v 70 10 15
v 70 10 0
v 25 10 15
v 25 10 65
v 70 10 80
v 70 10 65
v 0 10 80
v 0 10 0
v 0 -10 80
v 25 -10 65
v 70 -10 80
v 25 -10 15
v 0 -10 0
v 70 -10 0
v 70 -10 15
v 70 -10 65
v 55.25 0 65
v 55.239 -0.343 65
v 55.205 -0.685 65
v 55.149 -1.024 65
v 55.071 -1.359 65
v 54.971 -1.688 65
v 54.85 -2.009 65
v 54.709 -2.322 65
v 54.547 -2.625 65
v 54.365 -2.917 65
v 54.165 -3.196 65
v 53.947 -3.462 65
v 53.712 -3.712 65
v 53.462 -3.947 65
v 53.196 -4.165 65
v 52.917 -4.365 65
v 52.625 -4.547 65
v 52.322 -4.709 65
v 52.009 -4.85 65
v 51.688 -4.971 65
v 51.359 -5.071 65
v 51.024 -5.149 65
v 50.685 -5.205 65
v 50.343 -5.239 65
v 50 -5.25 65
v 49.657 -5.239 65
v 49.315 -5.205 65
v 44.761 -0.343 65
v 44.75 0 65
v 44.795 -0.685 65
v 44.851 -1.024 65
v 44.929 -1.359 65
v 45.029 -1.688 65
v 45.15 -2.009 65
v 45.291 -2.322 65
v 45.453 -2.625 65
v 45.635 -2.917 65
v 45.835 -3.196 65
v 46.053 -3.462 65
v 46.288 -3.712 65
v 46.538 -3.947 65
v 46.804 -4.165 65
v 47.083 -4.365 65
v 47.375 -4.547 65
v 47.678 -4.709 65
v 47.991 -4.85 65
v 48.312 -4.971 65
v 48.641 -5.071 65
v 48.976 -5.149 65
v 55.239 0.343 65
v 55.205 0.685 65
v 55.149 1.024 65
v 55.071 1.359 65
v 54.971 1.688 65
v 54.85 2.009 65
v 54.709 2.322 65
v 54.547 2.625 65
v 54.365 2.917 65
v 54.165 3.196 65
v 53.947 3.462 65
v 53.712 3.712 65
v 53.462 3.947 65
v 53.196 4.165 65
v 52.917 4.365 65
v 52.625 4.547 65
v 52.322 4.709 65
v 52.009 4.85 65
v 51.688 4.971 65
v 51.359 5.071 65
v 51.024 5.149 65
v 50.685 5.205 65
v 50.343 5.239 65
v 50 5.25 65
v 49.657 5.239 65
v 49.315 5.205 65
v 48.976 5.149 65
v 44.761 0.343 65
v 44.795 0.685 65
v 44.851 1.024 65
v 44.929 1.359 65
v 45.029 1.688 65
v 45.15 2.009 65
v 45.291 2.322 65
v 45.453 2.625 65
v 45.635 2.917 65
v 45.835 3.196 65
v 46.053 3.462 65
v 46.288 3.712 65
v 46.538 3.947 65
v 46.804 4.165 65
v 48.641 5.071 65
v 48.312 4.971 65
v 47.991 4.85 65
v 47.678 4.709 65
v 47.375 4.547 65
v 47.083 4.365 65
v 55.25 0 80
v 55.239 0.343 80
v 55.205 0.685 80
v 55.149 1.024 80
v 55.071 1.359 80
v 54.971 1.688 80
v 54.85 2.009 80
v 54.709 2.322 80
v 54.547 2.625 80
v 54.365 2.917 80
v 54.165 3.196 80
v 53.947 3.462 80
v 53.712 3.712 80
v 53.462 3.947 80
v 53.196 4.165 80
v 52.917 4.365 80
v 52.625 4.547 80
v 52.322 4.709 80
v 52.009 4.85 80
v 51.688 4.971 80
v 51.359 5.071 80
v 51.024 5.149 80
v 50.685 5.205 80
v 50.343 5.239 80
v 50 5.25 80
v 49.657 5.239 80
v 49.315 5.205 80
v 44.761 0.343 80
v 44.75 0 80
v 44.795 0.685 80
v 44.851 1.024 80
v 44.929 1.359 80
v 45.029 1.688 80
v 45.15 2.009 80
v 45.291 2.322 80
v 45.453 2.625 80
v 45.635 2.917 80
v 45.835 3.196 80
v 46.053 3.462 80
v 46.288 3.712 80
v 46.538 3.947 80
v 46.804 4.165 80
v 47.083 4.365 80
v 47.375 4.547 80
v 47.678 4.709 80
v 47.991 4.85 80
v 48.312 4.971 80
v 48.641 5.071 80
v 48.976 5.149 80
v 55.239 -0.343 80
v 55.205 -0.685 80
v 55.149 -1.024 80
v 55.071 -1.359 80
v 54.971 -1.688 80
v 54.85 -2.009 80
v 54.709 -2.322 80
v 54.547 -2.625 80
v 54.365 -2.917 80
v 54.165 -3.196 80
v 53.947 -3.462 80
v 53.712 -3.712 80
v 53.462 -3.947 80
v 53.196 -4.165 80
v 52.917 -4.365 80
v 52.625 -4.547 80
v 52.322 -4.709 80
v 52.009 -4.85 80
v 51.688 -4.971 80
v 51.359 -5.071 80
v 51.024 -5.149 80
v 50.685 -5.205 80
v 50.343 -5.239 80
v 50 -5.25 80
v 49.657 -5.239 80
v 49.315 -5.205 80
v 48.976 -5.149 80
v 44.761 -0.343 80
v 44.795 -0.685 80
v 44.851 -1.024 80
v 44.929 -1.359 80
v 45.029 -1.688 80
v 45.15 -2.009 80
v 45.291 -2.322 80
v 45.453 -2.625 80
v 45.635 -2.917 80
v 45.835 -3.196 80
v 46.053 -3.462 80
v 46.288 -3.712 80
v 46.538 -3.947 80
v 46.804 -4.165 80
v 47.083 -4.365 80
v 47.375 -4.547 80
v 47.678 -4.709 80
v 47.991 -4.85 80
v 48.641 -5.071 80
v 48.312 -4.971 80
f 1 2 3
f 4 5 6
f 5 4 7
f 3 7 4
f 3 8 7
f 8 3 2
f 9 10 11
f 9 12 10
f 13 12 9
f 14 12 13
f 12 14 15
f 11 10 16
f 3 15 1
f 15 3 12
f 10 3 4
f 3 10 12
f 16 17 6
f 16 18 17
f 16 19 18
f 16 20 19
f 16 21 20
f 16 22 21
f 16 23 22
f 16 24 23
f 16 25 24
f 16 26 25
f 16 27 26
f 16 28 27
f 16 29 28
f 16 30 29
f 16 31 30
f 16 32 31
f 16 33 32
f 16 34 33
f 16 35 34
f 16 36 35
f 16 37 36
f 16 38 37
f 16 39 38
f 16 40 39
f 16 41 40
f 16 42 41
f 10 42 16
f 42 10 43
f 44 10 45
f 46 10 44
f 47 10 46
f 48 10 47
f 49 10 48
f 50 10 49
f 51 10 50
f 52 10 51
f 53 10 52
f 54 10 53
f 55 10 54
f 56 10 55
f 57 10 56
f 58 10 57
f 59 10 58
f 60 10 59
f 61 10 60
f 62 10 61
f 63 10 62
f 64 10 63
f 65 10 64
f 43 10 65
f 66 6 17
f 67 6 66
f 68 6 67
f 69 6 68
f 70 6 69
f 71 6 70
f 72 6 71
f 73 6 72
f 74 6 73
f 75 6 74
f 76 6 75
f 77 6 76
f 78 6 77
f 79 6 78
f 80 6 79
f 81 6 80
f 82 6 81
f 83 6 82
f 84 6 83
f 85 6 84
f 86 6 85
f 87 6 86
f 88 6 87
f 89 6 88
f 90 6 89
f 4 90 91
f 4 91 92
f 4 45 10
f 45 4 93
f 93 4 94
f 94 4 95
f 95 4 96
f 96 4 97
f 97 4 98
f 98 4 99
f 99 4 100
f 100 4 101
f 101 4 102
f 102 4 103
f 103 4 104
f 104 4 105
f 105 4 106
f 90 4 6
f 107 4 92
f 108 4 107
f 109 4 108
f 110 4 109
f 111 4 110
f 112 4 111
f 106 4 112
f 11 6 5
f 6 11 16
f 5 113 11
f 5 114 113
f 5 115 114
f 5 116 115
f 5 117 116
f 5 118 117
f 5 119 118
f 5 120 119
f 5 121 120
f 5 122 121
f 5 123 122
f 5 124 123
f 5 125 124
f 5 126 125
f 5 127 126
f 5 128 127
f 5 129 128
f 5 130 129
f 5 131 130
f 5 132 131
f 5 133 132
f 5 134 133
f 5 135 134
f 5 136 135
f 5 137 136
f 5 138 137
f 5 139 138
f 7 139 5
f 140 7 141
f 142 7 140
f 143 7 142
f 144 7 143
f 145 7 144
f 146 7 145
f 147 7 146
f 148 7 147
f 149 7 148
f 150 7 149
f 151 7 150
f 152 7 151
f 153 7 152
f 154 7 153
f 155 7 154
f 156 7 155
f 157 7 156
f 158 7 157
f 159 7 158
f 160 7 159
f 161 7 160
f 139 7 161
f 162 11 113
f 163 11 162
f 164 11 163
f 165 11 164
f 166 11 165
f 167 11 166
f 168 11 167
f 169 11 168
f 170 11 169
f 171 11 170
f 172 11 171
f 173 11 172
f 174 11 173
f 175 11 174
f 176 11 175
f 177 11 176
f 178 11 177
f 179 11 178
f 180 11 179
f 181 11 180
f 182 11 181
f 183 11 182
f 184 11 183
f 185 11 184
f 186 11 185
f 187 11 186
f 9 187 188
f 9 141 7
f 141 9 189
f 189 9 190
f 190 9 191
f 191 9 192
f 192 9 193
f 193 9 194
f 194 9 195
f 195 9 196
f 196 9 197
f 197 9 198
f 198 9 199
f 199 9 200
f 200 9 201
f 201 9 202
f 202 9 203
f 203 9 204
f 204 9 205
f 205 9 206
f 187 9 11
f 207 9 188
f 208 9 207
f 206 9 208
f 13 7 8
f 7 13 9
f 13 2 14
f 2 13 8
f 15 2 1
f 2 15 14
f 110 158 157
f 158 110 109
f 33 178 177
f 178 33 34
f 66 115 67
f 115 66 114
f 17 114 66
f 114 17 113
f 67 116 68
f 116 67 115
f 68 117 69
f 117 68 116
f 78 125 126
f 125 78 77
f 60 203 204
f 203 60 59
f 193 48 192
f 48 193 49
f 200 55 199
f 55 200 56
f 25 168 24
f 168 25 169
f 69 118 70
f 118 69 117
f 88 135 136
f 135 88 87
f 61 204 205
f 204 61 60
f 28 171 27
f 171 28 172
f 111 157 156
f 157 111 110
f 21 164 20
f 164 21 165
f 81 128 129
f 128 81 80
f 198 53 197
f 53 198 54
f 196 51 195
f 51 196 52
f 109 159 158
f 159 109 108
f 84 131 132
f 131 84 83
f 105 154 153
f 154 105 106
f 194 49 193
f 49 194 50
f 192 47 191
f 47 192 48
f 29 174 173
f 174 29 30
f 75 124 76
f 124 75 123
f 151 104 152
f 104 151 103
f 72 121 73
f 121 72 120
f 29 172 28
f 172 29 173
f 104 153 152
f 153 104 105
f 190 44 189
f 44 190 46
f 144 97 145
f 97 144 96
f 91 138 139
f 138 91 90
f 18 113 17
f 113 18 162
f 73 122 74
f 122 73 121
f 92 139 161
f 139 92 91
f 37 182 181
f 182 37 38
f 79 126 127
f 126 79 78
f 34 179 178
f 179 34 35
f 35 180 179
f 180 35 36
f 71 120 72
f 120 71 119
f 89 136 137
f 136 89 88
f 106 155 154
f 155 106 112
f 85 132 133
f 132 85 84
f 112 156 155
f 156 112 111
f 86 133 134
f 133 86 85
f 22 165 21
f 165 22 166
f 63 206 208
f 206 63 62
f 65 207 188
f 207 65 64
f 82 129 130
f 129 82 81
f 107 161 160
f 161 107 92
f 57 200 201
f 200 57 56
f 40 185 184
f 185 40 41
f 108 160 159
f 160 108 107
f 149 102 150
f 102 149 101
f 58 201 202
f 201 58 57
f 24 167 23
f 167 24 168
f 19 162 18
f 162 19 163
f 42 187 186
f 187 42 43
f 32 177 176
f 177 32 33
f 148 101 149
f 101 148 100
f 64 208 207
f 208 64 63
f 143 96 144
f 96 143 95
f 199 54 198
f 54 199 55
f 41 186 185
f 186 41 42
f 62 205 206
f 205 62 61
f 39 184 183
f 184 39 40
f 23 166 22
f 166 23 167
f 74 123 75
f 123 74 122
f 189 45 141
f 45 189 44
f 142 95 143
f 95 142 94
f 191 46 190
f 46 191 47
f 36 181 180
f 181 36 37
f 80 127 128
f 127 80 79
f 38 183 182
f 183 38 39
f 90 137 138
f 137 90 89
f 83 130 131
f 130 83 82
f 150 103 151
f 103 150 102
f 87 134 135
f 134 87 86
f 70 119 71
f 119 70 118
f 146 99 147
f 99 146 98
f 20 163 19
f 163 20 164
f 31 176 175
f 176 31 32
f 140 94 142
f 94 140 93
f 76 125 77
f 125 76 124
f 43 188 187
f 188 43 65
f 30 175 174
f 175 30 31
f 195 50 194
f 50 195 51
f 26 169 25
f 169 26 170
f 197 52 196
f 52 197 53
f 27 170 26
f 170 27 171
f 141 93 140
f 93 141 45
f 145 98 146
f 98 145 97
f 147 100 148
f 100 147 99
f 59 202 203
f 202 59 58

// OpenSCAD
// t2-010 C-clamp frame
$fn = 96;
throat_depth = 45;   // jaw opening depth in X
jaw_opening = 50;    // jaw opening height in Z
body_width = 20;
frame_x = 70;
frame_z = 80;
arm_thickness = 15;
screw_x = 50;
screw_diameter = 10.5;

difference() {
    translate([0, body_width / 2, 0]) rotate([90, 0, 0])
        linear_extrude(body_width)
            difference() {
                square([frame_x, frame_z]);
                translate([frame_x - throat_depth, arm_thickness])
                    square([throat_depth + 1, jaw_opening]);
            }
    translate([screw_x, 0, arm_thickness + jaw_opening - 1])
        cylinder(d = screw_diameter, h = arm_thickness + 2);
}
